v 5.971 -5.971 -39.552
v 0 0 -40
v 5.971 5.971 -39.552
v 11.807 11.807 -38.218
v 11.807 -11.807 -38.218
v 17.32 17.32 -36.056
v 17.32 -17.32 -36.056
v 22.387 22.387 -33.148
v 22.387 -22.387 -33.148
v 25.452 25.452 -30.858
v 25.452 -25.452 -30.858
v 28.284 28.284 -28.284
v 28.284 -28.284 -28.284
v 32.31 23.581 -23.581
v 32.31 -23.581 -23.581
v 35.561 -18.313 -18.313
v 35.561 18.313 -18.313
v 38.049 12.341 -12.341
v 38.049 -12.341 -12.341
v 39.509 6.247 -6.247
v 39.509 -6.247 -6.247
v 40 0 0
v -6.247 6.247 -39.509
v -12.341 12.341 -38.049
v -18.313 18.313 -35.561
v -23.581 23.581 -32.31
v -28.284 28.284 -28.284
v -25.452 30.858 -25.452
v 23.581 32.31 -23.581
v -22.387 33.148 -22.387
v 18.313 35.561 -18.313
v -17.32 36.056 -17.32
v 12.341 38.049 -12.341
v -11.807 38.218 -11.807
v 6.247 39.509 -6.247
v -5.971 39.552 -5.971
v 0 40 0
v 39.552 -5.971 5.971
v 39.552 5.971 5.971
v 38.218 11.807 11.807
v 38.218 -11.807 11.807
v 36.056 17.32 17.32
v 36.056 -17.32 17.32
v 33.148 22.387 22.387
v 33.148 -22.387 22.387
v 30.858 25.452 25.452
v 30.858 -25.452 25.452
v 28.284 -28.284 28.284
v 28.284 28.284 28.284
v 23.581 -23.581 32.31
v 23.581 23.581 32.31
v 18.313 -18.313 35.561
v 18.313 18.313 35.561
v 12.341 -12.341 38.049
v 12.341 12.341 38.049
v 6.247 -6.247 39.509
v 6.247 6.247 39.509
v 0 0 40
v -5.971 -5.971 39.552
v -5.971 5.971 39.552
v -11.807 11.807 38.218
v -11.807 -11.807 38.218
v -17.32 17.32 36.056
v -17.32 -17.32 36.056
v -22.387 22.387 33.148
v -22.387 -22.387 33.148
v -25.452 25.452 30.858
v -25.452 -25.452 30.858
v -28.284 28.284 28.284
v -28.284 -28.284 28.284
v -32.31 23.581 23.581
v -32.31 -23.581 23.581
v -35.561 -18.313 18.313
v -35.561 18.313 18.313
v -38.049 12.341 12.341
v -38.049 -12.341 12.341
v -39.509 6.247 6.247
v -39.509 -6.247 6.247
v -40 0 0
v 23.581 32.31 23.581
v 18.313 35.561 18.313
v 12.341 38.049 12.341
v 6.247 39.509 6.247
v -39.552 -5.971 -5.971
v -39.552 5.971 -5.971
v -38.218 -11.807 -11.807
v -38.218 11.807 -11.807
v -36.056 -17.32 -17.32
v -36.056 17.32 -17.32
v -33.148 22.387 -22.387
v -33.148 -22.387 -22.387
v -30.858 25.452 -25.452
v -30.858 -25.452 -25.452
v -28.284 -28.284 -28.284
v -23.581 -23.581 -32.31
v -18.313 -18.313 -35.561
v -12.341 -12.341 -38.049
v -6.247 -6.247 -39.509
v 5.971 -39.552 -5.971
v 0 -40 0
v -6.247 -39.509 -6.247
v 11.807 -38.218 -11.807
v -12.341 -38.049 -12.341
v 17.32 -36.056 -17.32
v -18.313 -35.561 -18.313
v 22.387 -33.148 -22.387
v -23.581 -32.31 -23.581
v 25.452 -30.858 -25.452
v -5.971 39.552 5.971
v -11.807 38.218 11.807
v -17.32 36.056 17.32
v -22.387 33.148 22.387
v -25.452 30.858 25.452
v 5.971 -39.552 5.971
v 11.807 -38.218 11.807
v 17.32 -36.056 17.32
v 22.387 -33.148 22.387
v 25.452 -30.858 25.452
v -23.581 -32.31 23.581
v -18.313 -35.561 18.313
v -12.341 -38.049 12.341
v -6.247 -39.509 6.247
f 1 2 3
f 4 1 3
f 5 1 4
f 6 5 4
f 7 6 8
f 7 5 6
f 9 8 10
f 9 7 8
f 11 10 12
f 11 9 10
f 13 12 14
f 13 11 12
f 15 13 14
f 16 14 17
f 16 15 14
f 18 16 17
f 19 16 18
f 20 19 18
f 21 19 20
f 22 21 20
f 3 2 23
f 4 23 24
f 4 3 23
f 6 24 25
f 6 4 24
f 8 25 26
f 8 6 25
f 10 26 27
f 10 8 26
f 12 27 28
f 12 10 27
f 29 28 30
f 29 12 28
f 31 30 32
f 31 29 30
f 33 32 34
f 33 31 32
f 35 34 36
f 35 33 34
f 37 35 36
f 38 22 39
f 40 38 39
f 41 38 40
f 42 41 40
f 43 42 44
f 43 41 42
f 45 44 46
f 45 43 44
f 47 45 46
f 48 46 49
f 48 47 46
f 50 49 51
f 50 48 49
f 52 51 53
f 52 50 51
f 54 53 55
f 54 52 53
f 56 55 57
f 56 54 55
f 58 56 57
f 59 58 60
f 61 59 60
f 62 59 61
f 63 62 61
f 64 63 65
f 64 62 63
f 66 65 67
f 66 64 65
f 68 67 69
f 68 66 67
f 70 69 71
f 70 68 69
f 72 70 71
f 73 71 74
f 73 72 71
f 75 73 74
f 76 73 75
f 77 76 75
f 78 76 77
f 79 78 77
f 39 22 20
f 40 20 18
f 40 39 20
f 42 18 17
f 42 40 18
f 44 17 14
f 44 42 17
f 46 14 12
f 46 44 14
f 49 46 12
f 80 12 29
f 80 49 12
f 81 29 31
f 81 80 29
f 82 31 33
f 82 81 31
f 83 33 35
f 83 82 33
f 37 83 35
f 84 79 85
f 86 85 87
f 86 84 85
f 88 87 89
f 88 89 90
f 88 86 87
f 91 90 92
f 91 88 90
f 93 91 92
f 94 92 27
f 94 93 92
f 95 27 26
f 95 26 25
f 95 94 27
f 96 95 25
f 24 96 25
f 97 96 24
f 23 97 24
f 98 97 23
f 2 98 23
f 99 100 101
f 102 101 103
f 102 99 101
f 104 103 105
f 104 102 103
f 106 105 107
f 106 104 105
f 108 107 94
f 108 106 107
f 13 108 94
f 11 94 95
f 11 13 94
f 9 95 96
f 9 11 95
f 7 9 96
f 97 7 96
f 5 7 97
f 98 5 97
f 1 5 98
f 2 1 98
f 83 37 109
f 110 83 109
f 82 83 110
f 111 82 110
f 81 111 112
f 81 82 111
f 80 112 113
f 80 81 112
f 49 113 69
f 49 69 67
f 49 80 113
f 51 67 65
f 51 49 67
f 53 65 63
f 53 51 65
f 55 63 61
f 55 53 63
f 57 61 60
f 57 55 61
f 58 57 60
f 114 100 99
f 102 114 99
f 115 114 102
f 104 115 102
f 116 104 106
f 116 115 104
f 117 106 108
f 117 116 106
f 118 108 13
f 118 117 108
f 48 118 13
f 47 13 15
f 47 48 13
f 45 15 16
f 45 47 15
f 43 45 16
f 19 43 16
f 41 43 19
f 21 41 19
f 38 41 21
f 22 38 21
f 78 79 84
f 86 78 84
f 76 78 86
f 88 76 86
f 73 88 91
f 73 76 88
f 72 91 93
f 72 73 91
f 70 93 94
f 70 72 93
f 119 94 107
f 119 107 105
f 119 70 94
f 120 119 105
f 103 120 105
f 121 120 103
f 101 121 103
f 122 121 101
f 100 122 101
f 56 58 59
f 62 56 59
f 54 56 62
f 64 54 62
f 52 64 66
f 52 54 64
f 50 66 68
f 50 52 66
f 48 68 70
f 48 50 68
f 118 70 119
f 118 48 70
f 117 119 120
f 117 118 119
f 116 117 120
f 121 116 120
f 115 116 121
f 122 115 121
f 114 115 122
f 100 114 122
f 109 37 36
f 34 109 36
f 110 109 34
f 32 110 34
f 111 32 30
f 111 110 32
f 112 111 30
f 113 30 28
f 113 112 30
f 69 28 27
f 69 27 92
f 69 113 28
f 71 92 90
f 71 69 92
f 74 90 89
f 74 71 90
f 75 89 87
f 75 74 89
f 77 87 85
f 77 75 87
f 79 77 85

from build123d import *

# Parameters (mm, degrees)
F0_R     = 40
F1_DEPTH = 100
F2_R     = 40
F3_DEPTH = 100
F4_R     = 40
F5_DEPTH = 100


with BuildPart() as f1:
    # F0 (on Front) → F1 (new body, symmetric)
    with BuildSketch(Plane.XZ):
        Circle(F0_R)
    extrude(amount=F1_DEPTH, both=True)

    # F2 (on Top) → F3 (intersect, symmetric)
    with BuildSketch(Plane.XY):
        Circle(F2_R)
    extrude(amount=F3_DEPTH, both=True, mode=Mode.INTERSECT)

    # F4 (on Right) → F5 (intersect, symmetric)
    with BuildSketch(Plane.YZ):
        Circle(F4_R)
    extrude(amount=F5_DEPTH, both=True, mode=Mode.INTERSECT)


solid = f1.part
